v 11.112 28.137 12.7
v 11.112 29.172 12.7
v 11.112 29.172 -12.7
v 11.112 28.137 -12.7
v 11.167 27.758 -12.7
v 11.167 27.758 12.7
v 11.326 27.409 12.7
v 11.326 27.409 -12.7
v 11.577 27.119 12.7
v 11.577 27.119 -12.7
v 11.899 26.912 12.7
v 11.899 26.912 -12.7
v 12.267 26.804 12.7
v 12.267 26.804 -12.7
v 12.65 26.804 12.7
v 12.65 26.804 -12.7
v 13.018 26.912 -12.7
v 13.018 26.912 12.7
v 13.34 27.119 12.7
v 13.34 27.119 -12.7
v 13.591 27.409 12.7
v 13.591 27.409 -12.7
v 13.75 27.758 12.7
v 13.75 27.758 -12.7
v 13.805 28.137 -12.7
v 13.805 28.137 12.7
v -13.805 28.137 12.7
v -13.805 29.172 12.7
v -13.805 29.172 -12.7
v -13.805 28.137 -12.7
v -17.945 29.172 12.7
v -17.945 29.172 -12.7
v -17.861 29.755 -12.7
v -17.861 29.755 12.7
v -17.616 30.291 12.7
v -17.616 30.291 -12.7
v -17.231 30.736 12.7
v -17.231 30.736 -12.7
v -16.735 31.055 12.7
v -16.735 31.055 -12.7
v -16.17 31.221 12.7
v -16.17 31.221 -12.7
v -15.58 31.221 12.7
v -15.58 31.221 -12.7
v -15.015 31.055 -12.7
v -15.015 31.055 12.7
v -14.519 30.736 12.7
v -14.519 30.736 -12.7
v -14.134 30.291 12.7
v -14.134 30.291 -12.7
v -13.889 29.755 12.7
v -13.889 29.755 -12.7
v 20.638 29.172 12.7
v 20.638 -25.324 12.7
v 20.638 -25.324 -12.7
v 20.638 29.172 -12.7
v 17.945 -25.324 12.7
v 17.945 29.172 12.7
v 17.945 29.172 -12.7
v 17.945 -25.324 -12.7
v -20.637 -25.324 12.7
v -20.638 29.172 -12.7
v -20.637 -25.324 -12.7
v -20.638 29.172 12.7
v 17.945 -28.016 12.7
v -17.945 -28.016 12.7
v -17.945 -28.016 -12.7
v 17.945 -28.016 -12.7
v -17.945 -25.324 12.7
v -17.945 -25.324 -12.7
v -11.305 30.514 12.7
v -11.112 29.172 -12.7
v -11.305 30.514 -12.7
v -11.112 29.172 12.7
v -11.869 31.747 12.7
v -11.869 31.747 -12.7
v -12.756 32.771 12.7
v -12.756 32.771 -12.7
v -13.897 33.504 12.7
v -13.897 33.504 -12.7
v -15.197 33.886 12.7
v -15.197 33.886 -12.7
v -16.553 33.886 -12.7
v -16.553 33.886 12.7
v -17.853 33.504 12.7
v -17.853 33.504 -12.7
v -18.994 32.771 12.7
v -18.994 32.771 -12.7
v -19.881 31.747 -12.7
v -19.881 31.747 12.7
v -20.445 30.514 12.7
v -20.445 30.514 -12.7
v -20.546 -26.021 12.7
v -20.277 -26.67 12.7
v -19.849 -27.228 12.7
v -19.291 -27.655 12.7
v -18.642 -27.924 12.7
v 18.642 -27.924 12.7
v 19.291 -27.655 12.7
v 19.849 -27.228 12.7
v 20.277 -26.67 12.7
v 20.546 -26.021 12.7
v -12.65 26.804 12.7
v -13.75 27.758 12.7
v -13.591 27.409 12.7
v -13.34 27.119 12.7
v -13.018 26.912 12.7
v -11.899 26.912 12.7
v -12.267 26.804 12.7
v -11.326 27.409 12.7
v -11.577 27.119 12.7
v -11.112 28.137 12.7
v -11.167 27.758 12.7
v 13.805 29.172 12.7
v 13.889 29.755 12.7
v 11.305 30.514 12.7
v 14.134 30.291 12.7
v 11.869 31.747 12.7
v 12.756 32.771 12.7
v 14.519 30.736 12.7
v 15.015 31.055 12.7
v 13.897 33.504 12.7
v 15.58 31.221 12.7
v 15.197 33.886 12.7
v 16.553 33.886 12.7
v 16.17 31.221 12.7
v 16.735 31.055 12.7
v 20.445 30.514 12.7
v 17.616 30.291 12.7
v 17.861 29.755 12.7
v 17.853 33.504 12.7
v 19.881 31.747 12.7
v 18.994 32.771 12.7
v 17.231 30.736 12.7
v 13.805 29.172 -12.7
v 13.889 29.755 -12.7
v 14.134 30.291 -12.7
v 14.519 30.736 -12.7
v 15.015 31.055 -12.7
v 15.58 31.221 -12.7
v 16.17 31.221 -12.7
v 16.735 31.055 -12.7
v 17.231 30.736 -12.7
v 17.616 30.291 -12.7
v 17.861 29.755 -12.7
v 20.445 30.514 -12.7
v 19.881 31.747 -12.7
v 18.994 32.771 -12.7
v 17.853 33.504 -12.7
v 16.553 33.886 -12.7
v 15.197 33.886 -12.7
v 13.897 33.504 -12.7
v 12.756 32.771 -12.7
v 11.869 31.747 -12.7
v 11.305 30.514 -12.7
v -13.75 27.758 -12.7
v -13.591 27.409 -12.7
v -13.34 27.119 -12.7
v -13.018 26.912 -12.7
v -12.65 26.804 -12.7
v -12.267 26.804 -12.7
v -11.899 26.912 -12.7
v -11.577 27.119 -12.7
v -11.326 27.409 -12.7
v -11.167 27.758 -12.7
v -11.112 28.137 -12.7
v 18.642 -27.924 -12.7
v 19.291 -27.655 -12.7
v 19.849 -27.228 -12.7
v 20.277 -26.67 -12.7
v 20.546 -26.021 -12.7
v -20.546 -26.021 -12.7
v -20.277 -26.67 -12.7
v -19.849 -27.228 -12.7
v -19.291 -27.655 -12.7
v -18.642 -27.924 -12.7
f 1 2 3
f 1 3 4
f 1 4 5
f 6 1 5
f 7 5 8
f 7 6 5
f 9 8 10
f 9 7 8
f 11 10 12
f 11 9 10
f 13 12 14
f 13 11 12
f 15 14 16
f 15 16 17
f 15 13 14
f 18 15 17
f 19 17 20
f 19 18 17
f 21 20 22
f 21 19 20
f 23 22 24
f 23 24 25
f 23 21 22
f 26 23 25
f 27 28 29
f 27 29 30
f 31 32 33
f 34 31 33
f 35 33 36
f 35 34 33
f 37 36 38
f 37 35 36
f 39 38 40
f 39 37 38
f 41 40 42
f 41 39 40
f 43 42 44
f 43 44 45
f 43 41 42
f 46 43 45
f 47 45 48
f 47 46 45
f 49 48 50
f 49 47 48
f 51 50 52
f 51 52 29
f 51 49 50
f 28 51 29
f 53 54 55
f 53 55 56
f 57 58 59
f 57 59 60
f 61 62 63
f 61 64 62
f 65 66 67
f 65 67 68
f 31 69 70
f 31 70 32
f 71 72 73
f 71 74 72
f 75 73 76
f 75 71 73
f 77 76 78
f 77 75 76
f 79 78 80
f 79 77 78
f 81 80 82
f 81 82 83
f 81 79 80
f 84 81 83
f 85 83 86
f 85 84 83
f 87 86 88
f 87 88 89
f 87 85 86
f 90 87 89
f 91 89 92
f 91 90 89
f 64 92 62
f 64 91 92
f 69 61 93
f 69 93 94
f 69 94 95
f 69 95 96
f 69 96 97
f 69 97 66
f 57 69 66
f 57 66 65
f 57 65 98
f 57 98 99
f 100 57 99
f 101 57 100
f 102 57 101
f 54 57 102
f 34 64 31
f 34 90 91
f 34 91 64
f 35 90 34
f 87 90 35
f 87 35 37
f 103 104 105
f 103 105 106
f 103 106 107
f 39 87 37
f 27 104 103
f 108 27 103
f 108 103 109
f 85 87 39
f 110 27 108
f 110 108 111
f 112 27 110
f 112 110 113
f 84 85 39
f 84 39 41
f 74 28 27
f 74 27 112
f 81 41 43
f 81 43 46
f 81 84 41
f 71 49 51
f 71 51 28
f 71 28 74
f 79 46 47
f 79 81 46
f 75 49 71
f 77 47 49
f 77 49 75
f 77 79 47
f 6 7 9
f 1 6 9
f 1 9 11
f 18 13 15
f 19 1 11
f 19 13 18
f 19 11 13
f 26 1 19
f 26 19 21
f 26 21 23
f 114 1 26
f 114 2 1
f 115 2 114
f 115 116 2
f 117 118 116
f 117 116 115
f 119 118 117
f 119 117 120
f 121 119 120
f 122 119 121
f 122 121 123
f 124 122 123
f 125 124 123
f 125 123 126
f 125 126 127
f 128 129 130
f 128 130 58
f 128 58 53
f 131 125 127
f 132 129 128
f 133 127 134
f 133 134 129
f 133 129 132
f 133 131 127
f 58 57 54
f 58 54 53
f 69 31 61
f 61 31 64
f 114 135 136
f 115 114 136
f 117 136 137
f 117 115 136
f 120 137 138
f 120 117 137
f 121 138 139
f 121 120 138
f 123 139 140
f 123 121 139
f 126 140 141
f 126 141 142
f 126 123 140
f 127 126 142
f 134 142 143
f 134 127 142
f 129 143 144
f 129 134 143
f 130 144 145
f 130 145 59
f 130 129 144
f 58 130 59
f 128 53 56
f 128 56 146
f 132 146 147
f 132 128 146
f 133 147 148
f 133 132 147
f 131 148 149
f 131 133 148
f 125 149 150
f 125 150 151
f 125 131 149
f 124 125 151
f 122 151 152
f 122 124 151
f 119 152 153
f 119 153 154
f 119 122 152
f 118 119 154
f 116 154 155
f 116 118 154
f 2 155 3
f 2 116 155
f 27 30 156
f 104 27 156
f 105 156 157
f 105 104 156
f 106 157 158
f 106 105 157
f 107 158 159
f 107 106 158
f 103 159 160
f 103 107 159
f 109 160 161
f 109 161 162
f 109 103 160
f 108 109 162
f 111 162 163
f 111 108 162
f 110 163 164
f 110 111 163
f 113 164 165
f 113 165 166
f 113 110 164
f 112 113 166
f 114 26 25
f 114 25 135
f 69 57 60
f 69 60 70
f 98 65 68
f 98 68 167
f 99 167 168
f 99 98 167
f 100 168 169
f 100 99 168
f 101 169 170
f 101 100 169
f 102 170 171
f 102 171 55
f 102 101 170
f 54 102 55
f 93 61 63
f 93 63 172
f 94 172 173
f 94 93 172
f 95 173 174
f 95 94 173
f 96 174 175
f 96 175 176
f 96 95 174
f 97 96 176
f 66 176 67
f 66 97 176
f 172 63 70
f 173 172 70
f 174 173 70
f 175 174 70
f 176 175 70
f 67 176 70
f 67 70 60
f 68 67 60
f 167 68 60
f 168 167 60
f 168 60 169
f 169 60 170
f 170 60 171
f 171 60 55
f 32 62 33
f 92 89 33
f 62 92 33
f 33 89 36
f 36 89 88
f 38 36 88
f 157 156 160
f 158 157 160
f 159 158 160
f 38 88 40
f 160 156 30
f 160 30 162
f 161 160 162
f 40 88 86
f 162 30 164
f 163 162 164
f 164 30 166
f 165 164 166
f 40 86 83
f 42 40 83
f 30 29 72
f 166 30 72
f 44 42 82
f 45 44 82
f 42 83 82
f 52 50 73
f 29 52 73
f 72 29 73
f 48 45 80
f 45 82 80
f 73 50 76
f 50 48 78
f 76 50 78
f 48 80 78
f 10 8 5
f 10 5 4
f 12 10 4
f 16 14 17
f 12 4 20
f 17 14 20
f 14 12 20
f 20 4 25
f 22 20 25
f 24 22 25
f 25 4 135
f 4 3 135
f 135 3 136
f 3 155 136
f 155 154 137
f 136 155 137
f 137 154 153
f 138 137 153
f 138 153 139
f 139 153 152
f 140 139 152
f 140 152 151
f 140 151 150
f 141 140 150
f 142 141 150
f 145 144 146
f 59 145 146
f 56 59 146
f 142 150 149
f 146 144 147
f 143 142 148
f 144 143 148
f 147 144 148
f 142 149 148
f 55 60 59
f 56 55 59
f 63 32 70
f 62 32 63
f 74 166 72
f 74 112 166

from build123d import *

# Parameters (mm, degrees)
BASE_EXTRUDE_DEPTH = 12.7


with BuildPart() as part:
    # Sketch1 → Base-Extrude (new, symmetric)
    with BuildSketch(Plane.XY):
        with BuildLine():
            Line((-20.6375, 29.1719), (-20.6375, -25.3238))
            ThreePointArc((-20.6375, -25.3238), (-19.848914298, -27.227614298), (-17.9451, -28.0162))
            Line((-17.9451, -28.0162), (17.9451, -28.0162))
            ThreePointArc((17.9451, -28.0162), (19.848914298, -27.227614298), (20.6375, -25.3238))
            Line((20.6375, -25.3238), (20.6375, 29.1719))
            ThreePointArc((20.6375, 29.1719), (15.875, 33.9344), (11.1125, 29.1719))
            Line((11.1125, 29.1719), (11.1125, 28.13685))
            ThreePointArc((11.1125, 28.13685), (12.4587, 26.79065), (13.8049, 28.13685))
            Line((13.8049, 28.13685), (13.8049, 29.1719))
            ThreePointArc((13.8049, 29.1719), (15.875, 31.242), (17.9451, 29.1719))
            Line((17.9451, 29.1719), (17.9451, -25.3238))
            Line((17.9451, -25.3238), (-17.9451, -25.3238))
            Line((-17.9451, -25.3238), (-17.9451, 29.1719))
            ThreePointArc((-17.9451, 29.1719), (-15.875, 31.242), (-13.8049, 29.1719))
            Line((-13.8049, 29.1719), (-13.8049, 28.13685))
            ThreePointArc((-13.8049, 28.13685), (-12.4587, 26.79065), (-11.1125, 28.13685))
            Line((-11.1125, 28.13685), (-11.1125, 29.1719))
            ThreePointArc((-11.1125, 29.1719), (-15.875, 33.9344), (-20.6375, 29.1719))
        make_face()
    extrude(amount=BASE_EXTRUDE_DEPTH, both=True)


solid = part.part
